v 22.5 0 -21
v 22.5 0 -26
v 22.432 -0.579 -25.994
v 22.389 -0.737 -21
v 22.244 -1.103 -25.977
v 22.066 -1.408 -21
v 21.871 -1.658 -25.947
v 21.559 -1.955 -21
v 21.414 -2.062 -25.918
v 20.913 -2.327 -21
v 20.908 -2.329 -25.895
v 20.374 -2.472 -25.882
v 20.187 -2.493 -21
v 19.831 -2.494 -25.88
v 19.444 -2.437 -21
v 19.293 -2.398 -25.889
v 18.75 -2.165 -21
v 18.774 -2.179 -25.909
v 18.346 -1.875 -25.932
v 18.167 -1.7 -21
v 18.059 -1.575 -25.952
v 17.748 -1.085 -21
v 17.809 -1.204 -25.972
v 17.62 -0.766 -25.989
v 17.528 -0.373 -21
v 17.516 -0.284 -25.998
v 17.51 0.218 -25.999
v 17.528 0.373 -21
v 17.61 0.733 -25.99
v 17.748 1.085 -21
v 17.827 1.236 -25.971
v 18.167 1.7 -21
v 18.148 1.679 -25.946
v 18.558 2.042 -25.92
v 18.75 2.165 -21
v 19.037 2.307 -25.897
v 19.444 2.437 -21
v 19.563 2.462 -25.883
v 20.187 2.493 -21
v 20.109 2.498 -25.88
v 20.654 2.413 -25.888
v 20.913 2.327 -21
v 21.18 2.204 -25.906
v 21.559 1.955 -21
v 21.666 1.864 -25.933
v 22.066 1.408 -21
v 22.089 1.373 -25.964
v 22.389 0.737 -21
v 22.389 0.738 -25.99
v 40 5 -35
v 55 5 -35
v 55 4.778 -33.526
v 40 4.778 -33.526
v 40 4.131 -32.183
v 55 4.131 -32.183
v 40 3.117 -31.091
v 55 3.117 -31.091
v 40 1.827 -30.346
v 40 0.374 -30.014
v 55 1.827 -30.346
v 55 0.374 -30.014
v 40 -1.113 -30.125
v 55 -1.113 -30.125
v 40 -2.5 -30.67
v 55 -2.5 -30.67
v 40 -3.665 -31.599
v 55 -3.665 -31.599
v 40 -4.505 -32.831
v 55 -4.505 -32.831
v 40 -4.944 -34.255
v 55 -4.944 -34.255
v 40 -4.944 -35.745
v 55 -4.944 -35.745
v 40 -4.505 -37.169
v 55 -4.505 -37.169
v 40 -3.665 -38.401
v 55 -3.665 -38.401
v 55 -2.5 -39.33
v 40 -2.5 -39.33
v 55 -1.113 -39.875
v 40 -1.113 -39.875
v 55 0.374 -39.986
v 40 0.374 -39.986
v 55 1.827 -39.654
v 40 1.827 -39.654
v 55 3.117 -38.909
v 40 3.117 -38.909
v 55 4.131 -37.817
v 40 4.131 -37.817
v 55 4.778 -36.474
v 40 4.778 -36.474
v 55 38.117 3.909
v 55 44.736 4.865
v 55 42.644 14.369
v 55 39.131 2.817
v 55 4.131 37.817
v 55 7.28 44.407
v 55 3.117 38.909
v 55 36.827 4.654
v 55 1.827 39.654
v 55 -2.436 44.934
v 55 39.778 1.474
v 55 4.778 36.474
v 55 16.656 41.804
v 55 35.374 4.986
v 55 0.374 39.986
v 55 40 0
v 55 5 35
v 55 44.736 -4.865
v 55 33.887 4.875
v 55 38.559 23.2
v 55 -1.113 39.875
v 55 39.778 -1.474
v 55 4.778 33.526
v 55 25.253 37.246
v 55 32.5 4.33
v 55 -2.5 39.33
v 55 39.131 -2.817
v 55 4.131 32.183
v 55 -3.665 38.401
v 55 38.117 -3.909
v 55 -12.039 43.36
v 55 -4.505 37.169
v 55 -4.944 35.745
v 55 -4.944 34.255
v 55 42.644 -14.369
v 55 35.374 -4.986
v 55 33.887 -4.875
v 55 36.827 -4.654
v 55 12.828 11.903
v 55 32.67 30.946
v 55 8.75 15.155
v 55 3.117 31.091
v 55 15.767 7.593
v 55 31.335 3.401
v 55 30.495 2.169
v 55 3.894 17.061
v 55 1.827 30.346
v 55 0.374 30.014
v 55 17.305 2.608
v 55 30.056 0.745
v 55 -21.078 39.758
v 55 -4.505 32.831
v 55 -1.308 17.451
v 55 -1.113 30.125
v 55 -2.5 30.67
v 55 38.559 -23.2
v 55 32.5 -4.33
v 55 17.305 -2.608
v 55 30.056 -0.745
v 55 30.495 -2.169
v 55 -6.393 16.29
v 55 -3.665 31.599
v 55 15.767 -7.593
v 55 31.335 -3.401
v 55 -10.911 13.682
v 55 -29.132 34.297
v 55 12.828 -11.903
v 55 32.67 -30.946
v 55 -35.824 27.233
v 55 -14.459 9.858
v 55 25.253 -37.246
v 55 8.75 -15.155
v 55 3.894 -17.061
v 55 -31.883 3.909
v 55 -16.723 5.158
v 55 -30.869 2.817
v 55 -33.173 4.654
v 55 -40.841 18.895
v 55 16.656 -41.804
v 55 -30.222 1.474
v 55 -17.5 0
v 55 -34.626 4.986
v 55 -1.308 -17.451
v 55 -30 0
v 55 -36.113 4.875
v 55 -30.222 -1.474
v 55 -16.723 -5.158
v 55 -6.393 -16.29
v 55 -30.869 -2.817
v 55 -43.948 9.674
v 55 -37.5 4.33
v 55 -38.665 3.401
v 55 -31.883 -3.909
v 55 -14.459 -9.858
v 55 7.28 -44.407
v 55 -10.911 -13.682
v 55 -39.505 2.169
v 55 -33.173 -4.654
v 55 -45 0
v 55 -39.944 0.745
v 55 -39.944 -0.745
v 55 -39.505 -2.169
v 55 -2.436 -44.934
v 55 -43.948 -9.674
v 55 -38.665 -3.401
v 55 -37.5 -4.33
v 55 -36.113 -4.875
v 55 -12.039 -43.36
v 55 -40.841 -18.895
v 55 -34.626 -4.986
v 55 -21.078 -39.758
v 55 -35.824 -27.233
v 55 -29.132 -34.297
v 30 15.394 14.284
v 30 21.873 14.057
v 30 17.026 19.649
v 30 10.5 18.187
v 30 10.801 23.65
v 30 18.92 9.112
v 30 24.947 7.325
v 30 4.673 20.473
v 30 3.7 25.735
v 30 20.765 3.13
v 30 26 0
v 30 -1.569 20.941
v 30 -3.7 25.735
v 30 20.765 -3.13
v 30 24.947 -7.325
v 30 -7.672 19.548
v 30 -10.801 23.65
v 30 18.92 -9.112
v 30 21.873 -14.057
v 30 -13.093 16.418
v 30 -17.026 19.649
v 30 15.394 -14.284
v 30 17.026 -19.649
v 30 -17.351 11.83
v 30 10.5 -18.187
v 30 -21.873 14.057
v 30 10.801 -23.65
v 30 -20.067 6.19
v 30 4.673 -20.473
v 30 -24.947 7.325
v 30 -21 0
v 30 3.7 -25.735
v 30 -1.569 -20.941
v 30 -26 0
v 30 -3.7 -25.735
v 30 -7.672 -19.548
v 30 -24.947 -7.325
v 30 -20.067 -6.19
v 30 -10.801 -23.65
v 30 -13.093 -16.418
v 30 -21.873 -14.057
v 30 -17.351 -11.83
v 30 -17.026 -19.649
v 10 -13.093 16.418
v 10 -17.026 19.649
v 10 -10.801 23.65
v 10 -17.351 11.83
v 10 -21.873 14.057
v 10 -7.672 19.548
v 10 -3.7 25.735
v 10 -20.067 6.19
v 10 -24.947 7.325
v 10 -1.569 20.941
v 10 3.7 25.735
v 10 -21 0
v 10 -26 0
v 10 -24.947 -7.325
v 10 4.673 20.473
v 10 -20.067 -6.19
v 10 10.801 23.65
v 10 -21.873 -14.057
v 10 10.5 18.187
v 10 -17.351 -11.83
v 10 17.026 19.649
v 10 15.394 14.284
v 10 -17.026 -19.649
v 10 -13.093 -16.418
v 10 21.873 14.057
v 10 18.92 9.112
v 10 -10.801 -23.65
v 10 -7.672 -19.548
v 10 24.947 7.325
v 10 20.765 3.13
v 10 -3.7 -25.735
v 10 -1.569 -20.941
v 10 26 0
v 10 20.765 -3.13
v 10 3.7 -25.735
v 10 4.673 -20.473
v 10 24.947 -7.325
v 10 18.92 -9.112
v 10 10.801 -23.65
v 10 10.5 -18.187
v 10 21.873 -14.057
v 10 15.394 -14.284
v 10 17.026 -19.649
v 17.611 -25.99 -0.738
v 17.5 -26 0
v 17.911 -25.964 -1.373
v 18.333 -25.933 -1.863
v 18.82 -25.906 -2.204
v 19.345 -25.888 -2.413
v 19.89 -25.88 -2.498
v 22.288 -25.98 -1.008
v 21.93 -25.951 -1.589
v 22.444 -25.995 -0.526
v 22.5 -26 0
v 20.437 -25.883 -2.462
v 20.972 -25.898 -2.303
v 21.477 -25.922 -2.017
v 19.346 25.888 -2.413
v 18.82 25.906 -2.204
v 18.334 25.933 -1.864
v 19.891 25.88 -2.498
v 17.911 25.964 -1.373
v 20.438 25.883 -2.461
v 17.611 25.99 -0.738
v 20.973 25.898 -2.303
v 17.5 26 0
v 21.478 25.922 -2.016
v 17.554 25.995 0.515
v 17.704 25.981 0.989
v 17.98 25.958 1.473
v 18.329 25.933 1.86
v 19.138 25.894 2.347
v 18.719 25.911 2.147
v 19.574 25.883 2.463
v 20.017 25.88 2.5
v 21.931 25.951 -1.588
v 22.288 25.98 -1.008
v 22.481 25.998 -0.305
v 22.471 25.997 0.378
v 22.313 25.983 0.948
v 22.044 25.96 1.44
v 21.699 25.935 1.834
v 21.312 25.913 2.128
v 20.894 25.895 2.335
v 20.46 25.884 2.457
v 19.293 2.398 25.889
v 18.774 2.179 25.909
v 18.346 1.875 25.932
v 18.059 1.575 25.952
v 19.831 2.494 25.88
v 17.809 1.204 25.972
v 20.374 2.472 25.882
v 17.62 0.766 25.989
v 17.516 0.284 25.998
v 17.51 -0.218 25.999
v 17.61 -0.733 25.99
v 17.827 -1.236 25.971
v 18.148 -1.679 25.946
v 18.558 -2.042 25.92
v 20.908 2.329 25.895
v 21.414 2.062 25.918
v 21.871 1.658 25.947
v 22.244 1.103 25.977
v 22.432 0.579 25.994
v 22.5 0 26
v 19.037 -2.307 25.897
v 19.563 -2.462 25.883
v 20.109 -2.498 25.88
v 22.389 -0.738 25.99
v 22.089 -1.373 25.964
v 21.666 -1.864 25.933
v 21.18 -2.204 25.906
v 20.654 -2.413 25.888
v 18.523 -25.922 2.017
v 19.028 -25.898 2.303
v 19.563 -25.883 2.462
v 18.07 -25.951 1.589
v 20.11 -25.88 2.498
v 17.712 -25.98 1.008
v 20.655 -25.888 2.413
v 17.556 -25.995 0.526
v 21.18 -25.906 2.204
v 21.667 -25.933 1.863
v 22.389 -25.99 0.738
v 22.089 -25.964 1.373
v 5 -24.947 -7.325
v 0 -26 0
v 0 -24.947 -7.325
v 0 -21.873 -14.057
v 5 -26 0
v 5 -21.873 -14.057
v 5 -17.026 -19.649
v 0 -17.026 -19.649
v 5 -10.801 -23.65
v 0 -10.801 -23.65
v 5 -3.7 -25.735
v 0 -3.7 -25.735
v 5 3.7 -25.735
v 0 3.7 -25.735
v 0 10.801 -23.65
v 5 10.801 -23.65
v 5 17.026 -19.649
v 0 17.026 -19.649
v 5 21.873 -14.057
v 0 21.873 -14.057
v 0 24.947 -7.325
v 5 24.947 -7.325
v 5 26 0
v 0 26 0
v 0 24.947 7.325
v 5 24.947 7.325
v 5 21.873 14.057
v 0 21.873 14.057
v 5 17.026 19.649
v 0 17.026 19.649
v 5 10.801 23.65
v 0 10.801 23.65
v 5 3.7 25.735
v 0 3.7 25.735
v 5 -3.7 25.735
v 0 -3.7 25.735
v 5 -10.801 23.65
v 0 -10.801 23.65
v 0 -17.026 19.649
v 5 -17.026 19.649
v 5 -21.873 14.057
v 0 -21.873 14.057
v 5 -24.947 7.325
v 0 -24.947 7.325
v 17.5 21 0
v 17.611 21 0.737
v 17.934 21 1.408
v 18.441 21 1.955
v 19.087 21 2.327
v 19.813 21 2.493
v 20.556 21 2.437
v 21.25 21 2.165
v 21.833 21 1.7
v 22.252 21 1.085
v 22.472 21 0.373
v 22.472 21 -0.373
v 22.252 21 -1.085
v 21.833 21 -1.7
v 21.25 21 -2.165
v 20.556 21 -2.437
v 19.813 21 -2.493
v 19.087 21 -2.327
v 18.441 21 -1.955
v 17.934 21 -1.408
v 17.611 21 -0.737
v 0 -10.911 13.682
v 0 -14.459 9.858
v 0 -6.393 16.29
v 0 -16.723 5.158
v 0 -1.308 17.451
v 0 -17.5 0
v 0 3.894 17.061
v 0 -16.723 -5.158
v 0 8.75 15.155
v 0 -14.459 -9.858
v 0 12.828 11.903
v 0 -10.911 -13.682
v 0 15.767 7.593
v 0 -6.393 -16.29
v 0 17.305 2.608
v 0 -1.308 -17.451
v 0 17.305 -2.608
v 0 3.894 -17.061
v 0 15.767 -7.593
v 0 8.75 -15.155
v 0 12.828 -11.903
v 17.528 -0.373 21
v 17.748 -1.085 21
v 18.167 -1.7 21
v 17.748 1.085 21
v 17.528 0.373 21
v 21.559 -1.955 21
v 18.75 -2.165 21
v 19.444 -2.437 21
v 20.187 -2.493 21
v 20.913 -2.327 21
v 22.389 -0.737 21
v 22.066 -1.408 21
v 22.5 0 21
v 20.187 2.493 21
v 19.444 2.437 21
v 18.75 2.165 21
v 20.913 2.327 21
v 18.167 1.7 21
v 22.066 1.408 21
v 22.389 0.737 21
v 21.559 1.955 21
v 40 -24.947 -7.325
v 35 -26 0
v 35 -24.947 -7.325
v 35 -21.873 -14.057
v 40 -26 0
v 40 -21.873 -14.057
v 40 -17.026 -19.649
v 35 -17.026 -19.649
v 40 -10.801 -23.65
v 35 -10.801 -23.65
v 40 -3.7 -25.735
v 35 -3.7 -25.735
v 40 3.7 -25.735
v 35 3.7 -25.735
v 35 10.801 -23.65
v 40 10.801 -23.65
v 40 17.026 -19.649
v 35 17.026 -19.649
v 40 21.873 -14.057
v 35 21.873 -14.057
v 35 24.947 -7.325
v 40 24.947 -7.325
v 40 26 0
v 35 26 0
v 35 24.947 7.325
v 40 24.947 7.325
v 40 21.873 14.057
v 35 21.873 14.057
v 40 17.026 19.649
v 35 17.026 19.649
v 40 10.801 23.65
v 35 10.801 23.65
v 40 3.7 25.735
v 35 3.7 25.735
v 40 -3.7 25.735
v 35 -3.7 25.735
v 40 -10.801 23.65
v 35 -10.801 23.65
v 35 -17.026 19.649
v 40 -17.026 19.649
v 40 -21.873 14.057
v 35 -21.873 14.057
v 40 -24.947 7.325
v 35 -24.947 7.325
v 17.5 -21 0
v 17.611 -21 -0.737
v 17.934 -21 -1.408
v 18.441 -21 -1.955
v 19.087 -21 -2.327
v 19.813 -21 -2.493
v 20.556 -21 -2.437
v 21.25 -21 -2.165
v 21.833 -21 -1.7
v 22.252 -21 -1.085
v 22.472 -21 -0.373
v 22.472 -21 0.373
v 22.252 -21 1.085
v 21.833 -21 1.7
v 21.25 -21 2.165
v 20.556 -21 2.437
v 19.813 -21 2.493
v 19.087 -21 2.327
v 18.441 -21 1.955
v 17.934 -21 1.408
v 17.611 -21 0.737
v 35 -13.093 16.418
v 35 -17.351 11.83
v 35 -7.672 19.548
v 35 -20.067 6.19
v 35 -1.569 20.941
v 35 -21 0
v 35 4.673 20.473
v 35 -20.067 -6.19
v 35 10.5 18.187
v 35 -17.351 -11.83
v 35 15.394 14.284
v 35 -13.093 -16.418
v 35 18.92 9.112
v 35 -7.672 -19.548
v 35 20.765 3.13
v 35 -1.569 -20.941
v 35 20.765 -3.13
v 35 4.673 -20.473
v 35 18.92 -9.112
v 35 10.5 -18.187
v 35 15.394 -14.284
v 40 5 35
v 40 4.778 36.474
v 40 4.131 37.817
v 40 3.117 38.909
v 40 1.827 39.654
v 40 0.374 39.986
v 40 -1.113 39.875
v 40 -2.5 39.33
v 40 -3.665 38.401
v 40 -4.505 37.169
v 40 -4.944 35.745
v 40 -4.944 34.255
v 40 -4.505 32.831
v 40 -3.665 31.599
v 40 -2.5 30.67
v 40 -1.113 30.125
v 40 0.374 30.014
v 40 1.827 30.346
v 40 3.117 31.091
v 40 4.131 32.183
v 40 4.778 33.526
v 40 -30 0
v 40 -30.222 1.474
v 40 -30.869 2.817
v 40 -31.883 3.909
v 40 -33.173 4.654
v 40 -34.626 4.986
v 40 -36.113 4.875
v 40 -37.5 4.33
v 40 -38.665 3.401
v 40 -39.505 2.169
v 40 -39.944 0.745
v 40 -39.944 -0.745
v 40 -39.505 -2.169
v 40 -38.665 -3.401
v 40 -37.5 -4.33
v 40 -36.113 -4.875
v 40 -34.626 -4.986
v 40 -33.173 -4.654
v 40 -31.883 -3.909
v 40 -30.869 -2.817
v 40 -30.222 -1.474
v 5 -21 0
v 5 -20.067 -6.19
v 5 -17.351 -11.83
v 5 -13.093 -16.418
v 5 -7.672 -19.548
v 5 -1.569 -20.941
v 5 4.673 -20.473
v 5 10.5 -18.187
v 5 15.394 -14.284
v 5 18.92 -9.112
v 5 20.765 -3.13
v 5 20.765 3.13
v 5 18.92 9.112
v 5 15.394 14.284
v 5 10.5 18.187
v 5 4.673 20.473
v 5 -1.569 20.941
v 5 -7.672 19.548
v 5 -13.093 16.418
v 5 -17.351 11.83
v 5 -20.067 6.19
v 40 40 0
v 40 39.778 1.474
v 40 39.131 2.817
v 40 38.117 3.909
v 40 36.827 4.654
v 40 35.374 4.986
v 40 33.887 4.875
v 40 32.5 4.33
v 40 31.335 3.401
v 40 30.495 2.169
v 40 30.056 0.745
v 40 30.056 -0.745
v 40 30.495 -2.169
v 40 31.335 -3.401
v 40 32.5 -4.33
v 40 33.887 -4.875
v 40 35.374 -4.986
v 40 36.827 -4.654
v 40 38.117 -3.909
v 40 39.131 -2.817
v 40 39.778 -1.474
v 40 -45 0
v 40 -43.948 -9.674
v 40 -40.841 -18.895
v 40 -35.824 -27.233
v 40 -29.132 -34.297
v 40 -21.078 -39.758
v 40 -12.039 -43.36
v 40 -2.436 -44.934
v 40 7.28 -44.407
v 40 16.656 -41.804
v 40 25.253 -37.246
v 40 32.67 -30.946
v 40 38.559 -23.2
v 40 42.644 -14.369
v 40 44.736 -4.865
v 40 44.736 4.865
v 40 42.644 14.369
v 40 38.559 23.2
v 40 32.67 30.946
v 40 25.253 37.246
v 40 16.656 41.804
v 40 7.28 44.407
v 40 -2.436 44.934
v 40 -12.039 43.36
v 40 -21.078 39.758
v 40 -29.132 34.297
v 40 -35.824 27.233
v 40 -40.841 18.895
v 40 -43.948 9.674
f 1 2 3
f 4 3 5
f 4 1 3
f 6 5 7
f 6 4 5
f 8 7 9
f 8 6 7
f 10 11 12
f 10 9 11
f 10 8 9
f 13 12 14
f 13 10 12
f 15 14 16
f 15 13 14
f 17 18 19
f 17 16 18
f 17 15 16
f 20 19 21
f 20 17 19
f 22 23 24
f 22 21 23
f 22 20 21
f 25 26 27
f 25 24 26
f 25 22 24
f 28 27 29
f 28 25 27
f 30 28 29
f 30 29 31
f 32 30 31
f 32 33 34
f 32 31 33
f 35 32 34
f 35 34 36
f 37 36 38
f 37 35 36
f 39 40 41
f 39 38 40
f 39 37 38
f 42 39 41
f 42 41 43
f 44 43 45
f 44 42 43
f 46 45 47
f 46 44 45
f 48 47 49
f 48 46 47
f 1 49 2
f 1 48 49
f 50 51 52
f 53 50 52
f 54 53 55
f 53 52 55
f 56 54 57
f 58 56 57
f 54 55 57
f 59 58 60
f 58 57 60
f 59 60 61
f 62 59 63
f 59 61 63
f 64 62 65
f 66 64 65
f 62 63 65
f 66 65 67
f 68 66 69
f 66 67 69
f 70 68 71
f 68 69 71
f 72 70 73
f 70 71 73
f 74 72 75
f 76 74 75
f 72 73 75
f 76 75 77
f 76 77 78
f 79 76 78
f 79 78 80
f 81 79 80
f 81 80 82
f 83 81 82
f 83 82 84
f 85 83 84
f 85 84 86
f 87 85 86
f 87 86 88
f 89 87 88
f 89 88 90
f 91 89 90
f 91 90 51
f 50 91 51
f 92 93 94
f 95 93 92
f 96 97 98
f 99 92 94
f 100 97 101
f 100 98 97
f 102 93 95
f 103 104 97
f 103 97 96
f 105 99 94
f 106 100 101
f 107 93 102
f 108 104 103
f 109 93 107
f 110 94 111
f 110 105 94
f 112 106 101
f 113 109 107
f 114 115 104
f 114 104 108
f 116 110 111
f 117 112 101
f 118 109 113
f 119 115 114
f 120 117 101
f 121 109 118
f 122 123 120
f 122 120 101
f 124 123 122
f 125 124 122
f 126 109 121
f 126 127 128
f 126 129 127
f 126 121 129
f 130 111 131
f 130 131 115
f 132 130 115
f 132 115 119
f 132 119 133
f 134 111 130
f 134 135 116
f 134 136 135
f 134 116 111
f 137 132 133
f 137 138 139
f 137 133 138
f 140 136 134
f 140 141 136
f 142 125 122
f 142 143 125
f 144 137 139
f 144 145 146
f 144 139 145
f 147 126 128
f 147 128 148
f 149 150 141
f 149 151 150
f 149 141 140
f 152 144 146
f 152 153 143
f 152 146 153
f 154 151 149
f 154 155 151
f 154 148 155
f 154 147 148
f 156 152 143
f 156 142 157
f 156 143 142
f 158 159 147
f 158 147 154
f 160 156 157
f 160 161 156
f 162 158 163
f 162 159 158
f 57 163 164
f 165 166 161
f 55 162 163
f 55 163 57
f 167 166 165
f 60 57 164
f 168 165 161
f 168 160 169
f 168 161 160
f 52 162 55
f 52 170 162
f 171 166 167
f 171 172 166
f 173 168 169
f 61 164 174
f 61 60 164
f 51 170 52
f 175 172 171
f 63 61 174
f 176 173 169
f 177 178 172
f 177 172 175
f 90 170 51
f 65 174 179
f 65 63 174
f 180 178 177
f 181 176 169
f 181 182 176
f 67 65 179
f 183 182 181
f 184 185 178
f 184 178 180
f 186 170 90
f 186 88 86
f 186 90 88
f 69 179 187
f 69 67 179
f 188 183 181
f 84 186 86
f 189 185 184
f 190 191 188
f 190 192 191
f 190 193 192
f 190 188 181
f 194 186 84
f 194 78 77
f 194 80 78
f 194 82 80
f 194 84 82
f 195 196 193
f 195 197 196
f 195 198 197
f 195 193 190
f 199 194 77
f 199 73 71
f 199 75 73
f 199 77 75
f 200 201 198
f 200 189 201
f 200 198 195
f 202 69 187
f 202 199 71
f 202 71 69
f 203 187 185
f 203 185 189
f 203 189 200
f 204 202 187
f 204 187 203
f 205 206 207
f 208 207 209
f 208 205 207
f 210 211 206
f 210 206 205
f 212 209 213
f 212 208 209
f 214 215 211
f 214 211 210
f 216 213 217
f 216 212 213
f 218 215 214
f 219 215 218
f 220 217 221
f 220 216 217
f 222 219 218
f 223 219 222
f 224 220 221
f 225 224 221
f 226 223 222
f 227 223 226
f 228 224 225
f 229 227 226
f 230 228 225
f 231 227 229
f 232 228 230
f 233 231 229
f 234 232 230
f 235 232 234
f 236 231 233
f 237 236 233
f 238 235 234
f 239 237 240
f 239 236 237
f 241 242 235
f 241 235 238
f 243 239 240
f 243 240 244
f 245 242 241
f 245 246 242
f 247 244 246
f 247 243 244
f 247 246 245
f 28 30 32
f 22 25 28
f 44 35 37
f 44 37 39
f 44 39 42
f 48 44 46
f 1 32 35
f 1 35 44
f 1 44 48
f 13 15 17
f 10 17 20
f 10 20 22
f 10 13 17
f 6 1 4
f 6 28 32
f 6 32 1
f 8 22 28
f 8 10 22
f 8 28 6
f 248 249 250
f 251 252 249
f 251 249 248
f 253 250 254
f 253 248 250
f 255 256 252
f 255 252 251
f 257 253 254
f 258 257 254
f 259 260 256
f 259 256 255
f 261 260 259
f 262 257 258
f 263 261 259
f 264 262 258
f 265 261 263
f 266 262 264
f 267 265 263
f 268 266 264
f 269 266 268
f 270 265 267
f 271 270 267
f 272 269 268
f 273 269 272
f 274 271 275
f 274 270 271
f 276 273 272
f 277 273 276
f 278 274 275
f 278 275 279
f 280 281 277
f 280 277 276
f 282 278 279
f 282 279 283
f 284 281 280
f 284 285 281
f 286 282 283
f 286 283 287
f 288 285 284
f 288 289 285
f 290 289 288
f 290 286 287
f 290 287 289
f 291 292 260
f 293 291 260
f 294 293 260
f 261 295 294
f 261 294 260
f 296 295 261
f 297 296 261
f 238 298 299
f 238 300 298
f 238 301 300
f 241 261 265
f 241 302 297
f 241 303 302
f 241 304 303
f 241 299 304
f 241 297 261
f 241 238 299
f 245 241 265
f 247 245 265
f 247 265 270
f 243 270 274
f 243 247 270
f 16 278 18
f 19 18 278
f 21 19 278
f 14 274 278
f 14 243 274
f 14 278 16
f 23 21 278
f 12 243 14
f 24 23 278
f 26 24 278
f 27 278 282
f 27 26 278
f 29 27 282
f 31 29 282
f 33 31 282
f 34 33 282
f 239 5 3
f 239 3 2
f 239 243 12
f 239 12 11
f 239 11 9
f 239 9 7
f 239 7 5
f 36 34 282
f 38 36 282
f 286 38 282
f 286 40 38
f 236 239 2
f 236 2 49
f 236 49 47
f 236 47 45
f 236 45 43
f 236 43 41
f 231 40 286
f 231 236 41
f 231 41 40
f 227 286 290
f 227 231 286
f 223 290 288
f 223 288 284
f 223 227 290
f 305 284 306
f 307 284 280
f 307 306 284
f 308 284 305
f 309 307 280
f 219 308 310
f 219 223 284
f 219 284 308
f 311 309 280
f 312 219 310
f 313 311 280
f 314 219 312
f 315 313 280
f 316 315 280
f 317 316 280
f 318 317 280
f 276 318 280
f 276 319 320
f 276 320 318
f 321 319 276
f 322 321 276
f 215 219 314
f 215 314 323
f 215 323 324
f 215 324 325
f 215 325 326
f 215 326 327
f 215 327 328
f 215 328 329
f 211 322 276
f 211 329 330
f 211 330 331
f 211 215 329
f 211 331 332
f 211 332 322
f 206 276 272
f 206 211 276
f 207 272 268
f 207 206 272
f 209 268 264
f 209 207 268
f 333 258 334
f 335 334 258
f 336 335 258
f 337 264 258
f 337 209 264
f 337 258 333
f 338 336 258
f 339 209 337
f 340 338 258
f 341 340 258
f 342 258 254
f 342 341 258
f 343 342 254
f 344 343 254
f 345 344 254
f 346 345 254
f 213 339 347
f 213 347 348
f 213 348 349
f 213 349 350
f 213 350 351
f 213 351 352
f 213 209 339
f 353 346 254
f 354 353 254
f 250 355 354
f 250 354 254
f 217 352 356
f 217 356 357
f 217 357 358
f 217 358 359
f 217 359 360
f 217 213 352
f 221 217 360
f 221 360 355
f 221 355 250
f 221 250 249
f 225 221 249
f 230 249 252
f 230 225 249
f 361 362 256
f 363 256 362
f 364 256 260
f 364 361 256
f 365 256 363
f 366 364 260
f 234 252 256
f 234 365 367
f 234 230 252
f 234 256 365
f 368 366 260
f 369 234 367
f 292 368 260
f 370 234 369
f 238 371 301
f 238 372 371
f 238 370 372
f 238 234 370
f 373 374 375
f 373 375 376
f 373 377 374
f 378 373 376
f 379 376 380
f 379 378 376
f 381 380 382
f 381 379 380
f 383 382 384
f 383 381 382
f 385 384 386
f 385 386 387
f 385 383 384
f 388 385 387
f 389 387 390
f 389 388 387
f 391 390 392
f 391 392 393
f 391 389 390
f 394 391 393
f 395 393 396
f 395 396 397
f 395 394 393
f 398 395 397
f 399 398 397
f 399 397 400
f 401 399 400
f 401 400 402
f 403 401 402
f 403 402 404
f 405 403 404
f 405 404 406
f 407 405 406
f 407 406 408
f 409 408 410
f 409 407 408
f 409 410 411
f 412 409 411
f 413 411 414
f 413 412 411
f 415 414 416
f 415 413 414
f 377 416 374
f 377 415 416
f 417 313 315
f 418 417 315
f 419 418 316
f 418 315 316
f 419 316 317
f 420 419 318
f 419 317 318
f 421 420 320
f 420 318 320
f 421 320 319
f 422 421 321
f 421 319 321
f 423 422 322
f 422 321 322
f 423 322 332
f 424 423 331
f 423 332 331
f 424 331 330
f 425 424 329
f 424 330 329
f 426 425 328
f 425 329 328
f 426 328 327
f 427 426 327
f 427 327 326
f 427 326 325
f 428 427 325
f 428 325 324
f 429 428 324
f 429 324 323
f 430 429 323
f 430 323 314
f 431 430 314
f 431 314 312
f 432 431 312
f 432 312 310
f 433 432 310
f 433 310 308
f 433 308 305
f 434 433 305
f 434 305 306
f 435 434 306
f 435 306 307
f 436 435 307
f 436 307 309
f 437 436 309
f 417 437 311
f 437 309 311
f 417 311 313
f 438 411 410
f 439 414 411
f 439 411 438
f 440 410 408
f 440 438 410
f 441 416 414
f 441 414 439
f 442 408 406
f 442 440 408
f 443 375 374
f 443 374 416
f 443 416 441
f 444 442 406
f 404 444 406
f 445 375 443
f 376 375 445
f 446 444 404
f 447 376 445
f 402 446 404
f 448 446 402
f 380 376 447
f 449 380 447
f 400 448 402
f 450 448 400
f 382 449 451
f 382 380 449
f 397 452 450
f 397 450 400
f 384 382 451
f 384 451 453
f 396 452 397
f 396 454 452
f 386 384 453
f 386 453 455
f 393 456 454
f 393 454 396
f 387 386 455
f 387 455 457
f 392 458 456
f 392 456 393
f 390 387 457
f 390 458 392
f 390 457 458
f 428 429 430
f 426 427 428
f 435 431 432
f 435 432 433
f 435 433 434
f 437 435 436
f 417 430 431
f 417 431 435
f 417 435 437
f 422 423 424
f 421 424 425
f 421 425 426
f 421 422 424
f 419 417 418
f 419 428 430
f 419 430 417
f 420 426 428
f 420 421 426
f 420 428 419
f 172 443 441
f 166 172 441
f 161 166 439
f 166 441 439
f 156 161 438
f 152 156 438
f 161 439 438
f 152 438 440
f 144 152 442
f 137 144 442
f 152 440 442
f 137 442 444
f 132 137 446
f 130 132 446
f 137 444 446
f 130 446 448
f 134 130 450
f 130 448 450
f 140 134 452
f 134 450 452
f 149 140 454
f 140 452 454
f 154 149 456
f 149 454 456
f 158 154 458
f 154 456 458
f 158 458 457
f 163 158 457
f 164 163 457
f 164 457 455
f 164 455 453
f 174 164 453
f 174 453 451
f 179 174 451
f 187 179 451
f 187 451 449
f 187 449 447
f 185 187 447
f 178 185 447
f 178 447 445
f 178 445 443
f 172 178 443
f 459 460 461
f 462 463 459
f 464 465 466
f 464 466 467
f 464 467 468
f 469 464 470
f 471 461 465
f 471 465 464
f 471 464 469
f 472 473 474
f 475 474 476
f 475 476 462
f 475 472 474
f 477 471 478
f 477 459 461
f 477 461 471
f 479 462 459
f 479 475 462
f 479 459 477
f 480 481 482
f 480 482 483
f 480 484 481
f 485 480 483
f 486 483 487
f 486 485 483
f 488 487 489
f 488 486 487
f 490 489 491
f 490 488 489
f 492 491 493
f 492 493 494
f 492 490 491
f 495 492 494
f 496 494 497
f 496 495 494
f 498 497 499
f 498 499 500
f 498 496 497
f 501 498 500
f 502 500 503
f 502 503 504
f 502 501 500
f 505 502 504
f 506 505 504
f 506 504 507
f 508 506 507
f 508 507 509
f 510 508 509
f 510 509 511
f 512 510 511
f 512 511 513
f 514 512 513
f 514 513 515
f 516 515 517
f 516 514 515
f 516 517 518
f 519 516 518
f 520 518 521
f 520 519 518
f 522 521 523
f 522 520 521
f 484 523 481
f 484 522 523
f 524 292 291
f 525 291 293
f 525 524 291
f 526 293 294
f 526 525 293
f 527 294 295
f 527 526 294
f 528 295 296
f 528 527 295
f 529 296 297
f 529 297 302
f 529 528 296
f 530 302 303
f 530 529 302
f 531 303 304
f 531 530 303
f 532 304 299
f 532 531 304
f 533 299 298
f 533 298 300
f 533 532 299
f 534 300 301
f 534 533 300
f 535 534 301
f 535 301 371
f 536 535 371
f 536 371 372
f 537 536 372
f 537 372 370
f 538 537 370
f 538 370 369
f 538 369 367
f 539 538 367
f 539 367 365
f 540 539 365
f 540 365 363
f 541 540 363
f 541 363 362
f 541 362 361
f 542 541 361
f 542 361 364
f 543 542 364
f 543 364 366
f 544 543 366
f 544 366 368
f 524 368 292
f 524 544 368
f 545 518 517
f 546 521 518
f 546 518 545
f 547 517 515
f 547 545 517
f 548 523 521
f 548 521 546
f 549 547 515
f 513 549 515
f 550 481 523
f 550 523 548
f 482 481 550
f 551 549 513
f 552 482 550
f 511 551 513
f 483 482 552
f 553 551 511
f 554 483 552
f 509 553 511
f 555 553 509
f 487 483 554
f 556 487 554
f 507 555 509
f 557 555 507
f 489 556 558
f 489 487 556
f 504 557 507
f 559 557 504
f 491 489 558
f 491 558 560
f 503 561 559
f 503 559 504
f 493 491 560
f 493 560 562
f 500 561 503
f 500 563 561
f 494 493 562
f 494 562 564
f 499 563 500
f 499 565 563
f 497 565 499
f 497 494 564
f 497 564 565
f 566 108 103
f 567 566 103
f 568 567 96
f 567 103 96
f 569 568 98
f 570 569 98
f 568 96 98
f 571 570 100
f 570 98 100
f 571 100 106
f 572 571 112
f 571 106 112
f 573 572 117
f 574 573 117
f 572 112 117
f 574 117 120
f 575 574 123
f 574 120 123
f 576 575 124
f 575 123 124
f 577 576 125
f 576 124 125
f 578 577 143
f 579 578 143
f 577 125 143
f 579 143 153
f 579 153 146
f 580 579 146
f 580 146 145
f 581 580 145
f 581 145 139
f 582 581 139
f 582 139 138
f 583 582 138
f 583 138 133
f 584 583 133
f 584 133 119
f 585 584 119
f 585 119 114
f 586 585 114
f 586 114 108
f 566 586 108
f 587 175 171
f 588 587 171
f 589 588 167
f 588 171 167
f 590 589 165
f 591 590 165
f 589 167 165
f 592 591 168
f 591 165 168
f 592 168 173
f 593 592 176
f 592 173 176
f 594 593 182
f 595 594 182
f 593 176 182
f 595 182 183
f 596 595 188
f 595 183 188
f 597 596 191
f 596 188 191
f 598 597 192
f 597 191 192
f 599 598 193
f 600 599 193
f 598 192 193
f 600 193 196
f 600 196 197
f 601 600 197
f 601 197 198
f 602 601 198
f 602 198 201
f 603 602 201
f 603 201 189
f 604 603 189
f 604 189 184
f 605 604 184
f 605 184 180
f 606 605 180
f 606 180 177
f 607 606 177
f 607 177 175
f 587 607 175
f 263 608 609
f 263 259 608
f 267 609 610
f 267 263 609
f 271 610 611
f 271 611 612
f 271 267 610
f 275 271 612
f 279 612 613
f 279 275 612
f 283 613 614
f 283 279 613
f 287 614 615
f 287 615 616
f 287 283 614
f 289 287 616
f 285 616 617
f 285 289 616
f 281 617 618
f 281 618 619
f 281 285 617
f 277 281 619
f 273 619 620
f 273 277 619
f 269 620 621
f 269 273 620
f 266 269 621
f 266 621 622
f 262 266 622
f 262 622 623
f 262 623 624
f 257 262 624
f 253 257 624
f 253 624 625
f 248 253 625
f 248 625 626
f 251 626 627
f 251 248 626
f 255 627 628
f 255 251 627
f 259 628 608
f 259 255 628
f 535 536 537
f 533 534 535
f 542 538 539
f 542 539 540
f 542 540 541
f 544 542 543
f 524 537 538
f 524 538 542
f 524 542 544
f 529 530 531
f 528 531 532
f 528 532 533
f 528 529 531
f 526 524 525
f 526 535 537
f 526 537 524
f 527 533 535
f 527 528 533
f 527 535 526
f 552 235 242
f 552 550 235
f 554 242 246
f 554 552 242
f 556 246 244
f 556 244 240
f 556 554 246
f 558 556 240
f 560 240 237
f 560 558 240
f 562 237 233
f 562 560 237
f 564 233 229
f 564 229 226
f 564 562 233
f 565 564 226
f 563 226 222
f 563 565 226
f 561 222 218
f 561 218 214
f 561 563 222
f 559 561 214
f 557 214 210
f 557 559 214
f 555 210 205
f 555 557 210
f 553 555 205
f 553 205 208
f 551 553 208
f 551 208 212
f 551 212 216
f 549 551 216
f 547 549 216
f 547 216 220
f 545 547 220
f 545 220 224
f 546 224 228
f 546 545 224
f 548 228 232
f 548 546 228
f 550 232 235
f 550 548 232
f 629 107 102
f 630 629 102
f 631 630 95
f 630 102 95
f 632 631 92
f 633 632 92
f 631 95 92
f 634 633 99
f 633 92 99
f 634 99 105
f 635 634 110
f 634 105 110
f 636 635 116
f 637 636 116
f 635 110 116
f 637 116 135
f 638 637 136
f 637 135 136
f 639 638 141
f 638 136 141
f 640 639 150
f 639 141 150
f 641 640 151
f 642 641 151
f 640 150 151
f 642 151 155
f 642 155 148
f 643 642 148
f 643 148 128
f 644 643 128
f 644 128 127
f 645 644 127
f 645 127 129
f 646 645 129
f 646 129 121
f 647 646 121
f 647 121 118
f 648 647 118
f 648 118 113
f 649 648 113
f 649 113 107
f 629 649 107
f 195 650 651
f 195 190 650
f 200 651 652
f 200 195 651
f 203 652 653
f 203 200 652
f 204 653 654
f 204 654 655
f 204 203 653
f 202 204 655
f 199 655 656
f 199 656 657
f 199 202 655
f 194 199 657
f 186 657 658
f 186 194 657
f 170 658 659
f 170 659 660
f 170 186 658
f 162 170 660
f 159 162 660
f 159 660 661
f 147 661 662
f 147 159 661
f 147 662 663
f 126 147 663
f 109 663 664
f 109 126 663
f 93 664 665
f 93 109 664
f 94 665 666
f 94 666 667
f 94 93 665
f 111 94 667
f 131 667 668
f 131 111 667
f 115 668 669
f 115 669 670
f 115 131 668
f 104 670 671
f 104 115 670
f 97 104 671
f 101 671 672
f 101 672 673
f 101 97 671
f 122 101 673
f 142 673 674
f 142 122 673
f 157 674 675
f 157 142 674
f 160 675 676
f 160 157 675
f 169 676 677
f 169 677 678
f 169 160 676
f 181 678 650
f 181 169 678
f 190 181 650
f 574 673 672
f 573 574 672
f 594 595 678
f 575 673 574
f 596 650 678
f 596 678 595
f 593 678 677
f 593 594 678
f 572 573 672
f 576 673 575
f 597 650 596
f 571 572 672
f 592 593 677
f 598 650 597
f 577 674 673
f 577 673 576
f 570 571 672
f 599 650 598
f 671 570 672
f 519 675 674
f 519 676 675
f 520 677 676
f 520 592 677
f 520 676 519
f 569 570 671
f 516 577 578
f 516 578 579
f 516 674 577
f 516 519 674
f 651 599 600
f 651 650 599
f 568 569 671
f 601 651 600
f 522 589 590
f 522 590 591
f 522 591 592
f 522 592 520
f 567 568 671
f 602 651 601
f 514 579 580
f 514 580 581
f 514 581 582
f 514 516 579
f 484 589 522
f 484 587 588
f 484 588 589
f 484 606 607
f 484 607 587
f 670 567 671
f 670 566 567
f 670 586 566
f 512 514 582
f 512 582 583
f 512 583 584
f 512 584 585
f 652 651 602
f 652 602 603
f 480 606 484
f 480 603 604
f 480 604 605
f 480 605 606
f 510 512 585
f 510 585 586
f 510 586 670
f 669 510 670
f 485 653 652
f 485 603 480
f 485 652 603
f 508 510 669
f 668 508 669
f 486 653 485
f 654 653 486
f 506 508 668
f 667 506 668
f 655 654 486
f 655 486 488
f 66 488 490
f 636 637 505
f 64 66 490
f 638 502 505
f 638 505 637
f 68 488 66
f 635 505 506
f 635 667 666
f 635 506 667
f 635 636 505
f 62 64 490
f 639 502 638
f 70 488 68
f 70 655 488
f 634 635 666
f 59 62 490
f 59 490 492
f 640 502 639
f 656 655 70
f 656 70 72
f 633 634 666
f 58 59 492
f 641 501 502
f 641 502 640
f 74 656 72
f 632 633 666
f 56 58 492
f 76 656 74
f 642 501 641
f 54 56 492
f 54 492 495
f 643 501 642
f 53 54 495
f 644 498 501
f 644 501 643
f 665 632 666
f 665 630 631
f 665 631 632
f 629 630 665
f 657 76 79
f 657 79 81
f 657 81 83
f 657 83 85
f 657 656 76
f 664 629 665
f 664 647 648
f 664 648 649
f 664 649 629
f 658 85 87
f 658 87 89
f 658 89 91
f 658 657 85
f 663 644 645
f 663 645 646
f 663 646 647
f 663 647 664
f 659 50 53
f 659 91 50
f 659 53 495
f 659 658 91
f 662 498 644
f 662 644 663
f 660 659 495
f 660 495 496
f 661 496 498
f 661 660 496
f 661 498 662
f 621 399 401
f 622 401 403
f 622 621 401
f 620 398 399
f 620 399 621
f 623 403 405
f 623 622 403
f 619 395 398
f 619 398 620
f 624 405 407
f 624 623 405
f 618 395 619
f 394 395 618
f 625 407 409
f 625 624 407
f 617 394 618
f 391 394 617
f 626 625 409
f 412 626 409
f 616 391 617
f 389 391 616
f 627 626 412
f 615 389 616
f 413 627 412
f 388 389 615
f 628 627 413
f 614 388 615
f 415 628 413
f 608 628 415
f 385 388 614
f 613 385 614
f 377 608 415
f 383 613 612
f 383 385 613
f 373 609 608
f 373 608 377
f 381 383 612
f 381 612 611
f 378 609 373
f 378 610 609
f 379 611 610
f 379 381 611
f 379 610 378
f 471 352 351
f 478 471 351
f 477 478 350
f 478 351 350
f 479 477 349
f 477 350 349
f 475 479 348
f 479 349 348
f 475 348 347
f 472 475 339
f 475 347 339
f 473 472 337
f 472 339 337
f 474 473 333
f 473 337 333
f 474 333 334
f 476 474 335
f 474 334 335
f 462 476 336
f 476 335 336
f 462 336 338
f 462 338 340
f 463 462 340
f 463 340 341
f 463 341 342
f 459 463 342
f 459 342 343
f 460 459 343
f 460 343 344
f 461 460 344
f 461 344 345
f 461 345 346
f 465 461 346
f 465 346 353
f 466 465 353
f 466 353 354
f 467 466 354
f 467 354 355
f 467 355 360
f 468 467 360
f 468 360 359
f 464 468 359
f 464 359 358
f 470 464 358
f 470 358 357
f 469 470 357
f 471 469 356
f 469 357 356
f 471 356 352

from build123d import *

# Parameters (mm, degrees)
SKETCH2_R          = 17.5
CUT_EXTRUDE1_DEPTH = 85.113019206
SKETCH3_R          = 5
CUT_EXTRUDE2_DEPTH = 85.113019206
SKETCH4_R          = 2.5
CUT_EXTRUDE3_DEPTH = 5
SKETCH5_R          = 2.5
CUT_EXTRUDE4_DEPTH = 5
CUT_EXTRUDE5_START = -5
SKETCH6_R          = 2.5
CUT_EXTRUDE5_DEPTH = 5
CUT_EXTRUDE6_START = -5
SKETCH8_R          = 2.5
CUT_EXTRUDE6_DEPTH = 5


with BuildPart() as part:
    # Sketch1 → Revolve1 (revolve)
    with BuildSketch(Plane.XY):
        Polygon((0, 0), (0, 26), (5, 26), (5, 21), (10, 21), (10, 26), (30, 26), (30, 21), (35, 21), (35, 26), (40, 26), (40, 45), (55, 45), (55, 0), align=None)
    revolve(axis=Axis((0, 0, 0), (1, 0, 0)))

    # Sketch2 → Cut-Extrude1 (cut, through all)
    with BuildSketch(Plane.ZY):
        Circle(SKETCH2_R)
    extrude(amount=-CUT_EXTRUDE1_DEPTH, mode=Mode.SUBTRACT)

    # Sketch3 → Cut-Extrude2 (cut, through all)
    with BuildSketch(Plane(origin=(55, 0, 0), x_dir=(0, 0, -1), z_dir=(1, 0, 0))):
        with Locations((-35, 0)):
            Circle(SKETCH3_R)
        with Locations((0, 35)):
            Circle(SKETCH3_R)
        with Locations((35, 0)):
            Circle(SKETCH3_R)
        with Locations((0, -35)):
            Circle(SKETCH3_R)
    extrude(amount=-CUT_EXTRUDE2_DEPTH, mode=Mode.SUBTRACT)

    # Sketch4 → Cut-Extrude3 (cut)
    with BuildSketch(Plane(origin=(0, 26, 0), x_dir=(1, 0, 0), z_dir=(0, 1, 0))):
        with Locations((20, 0)):
            Circle(SKETCH4_R)
    extrude(amount=-CUT_EXTRUDE3_DEPTH, mode=Mode.SUBTRACT)

    # Sketch5 → Cut-Extrude4 (cut)
    with BuildSketch(Plane.XY.offset(26)):
        with Locations((20, 0)):
            Circle(SKETCH5_R)
    extrude(amount=-CUT_EXTRUDE4_DEPTH, mode=Mode.SUBTRACT)

    # Sketch6 → Cut-Extrude5 (cut)
    with BuildSketch(Plane(origin=(0, -26, 0), x_dir=(-1, 0, 0), z_dir=(0, -1, 0)).offset(CUT_EXTRUDE5_START)):
        with Locations((-20, 0)):
            Circle(SKETCH6_R)
    extrude(amount=CUT_EXTRUDE5_DEPTH, mode=Mode.SUBTRACT)

    # Sketch8 → Cut-Extrude6 (cut)
    with BuildSketch(Plane(origin=(0, 0, -26), x_dir=(-1, 0, 0), z_dir=(0, 0, -1)).offset(CUT_EXTRUDE6_START)):
        with Locations((-20, 0)):
            Circle(SKETCH8_R)
    extrude(amount=CUT_EXTRUDE6_DEPTH, mode=Mode.SUBTRACT)


solid = part.part
